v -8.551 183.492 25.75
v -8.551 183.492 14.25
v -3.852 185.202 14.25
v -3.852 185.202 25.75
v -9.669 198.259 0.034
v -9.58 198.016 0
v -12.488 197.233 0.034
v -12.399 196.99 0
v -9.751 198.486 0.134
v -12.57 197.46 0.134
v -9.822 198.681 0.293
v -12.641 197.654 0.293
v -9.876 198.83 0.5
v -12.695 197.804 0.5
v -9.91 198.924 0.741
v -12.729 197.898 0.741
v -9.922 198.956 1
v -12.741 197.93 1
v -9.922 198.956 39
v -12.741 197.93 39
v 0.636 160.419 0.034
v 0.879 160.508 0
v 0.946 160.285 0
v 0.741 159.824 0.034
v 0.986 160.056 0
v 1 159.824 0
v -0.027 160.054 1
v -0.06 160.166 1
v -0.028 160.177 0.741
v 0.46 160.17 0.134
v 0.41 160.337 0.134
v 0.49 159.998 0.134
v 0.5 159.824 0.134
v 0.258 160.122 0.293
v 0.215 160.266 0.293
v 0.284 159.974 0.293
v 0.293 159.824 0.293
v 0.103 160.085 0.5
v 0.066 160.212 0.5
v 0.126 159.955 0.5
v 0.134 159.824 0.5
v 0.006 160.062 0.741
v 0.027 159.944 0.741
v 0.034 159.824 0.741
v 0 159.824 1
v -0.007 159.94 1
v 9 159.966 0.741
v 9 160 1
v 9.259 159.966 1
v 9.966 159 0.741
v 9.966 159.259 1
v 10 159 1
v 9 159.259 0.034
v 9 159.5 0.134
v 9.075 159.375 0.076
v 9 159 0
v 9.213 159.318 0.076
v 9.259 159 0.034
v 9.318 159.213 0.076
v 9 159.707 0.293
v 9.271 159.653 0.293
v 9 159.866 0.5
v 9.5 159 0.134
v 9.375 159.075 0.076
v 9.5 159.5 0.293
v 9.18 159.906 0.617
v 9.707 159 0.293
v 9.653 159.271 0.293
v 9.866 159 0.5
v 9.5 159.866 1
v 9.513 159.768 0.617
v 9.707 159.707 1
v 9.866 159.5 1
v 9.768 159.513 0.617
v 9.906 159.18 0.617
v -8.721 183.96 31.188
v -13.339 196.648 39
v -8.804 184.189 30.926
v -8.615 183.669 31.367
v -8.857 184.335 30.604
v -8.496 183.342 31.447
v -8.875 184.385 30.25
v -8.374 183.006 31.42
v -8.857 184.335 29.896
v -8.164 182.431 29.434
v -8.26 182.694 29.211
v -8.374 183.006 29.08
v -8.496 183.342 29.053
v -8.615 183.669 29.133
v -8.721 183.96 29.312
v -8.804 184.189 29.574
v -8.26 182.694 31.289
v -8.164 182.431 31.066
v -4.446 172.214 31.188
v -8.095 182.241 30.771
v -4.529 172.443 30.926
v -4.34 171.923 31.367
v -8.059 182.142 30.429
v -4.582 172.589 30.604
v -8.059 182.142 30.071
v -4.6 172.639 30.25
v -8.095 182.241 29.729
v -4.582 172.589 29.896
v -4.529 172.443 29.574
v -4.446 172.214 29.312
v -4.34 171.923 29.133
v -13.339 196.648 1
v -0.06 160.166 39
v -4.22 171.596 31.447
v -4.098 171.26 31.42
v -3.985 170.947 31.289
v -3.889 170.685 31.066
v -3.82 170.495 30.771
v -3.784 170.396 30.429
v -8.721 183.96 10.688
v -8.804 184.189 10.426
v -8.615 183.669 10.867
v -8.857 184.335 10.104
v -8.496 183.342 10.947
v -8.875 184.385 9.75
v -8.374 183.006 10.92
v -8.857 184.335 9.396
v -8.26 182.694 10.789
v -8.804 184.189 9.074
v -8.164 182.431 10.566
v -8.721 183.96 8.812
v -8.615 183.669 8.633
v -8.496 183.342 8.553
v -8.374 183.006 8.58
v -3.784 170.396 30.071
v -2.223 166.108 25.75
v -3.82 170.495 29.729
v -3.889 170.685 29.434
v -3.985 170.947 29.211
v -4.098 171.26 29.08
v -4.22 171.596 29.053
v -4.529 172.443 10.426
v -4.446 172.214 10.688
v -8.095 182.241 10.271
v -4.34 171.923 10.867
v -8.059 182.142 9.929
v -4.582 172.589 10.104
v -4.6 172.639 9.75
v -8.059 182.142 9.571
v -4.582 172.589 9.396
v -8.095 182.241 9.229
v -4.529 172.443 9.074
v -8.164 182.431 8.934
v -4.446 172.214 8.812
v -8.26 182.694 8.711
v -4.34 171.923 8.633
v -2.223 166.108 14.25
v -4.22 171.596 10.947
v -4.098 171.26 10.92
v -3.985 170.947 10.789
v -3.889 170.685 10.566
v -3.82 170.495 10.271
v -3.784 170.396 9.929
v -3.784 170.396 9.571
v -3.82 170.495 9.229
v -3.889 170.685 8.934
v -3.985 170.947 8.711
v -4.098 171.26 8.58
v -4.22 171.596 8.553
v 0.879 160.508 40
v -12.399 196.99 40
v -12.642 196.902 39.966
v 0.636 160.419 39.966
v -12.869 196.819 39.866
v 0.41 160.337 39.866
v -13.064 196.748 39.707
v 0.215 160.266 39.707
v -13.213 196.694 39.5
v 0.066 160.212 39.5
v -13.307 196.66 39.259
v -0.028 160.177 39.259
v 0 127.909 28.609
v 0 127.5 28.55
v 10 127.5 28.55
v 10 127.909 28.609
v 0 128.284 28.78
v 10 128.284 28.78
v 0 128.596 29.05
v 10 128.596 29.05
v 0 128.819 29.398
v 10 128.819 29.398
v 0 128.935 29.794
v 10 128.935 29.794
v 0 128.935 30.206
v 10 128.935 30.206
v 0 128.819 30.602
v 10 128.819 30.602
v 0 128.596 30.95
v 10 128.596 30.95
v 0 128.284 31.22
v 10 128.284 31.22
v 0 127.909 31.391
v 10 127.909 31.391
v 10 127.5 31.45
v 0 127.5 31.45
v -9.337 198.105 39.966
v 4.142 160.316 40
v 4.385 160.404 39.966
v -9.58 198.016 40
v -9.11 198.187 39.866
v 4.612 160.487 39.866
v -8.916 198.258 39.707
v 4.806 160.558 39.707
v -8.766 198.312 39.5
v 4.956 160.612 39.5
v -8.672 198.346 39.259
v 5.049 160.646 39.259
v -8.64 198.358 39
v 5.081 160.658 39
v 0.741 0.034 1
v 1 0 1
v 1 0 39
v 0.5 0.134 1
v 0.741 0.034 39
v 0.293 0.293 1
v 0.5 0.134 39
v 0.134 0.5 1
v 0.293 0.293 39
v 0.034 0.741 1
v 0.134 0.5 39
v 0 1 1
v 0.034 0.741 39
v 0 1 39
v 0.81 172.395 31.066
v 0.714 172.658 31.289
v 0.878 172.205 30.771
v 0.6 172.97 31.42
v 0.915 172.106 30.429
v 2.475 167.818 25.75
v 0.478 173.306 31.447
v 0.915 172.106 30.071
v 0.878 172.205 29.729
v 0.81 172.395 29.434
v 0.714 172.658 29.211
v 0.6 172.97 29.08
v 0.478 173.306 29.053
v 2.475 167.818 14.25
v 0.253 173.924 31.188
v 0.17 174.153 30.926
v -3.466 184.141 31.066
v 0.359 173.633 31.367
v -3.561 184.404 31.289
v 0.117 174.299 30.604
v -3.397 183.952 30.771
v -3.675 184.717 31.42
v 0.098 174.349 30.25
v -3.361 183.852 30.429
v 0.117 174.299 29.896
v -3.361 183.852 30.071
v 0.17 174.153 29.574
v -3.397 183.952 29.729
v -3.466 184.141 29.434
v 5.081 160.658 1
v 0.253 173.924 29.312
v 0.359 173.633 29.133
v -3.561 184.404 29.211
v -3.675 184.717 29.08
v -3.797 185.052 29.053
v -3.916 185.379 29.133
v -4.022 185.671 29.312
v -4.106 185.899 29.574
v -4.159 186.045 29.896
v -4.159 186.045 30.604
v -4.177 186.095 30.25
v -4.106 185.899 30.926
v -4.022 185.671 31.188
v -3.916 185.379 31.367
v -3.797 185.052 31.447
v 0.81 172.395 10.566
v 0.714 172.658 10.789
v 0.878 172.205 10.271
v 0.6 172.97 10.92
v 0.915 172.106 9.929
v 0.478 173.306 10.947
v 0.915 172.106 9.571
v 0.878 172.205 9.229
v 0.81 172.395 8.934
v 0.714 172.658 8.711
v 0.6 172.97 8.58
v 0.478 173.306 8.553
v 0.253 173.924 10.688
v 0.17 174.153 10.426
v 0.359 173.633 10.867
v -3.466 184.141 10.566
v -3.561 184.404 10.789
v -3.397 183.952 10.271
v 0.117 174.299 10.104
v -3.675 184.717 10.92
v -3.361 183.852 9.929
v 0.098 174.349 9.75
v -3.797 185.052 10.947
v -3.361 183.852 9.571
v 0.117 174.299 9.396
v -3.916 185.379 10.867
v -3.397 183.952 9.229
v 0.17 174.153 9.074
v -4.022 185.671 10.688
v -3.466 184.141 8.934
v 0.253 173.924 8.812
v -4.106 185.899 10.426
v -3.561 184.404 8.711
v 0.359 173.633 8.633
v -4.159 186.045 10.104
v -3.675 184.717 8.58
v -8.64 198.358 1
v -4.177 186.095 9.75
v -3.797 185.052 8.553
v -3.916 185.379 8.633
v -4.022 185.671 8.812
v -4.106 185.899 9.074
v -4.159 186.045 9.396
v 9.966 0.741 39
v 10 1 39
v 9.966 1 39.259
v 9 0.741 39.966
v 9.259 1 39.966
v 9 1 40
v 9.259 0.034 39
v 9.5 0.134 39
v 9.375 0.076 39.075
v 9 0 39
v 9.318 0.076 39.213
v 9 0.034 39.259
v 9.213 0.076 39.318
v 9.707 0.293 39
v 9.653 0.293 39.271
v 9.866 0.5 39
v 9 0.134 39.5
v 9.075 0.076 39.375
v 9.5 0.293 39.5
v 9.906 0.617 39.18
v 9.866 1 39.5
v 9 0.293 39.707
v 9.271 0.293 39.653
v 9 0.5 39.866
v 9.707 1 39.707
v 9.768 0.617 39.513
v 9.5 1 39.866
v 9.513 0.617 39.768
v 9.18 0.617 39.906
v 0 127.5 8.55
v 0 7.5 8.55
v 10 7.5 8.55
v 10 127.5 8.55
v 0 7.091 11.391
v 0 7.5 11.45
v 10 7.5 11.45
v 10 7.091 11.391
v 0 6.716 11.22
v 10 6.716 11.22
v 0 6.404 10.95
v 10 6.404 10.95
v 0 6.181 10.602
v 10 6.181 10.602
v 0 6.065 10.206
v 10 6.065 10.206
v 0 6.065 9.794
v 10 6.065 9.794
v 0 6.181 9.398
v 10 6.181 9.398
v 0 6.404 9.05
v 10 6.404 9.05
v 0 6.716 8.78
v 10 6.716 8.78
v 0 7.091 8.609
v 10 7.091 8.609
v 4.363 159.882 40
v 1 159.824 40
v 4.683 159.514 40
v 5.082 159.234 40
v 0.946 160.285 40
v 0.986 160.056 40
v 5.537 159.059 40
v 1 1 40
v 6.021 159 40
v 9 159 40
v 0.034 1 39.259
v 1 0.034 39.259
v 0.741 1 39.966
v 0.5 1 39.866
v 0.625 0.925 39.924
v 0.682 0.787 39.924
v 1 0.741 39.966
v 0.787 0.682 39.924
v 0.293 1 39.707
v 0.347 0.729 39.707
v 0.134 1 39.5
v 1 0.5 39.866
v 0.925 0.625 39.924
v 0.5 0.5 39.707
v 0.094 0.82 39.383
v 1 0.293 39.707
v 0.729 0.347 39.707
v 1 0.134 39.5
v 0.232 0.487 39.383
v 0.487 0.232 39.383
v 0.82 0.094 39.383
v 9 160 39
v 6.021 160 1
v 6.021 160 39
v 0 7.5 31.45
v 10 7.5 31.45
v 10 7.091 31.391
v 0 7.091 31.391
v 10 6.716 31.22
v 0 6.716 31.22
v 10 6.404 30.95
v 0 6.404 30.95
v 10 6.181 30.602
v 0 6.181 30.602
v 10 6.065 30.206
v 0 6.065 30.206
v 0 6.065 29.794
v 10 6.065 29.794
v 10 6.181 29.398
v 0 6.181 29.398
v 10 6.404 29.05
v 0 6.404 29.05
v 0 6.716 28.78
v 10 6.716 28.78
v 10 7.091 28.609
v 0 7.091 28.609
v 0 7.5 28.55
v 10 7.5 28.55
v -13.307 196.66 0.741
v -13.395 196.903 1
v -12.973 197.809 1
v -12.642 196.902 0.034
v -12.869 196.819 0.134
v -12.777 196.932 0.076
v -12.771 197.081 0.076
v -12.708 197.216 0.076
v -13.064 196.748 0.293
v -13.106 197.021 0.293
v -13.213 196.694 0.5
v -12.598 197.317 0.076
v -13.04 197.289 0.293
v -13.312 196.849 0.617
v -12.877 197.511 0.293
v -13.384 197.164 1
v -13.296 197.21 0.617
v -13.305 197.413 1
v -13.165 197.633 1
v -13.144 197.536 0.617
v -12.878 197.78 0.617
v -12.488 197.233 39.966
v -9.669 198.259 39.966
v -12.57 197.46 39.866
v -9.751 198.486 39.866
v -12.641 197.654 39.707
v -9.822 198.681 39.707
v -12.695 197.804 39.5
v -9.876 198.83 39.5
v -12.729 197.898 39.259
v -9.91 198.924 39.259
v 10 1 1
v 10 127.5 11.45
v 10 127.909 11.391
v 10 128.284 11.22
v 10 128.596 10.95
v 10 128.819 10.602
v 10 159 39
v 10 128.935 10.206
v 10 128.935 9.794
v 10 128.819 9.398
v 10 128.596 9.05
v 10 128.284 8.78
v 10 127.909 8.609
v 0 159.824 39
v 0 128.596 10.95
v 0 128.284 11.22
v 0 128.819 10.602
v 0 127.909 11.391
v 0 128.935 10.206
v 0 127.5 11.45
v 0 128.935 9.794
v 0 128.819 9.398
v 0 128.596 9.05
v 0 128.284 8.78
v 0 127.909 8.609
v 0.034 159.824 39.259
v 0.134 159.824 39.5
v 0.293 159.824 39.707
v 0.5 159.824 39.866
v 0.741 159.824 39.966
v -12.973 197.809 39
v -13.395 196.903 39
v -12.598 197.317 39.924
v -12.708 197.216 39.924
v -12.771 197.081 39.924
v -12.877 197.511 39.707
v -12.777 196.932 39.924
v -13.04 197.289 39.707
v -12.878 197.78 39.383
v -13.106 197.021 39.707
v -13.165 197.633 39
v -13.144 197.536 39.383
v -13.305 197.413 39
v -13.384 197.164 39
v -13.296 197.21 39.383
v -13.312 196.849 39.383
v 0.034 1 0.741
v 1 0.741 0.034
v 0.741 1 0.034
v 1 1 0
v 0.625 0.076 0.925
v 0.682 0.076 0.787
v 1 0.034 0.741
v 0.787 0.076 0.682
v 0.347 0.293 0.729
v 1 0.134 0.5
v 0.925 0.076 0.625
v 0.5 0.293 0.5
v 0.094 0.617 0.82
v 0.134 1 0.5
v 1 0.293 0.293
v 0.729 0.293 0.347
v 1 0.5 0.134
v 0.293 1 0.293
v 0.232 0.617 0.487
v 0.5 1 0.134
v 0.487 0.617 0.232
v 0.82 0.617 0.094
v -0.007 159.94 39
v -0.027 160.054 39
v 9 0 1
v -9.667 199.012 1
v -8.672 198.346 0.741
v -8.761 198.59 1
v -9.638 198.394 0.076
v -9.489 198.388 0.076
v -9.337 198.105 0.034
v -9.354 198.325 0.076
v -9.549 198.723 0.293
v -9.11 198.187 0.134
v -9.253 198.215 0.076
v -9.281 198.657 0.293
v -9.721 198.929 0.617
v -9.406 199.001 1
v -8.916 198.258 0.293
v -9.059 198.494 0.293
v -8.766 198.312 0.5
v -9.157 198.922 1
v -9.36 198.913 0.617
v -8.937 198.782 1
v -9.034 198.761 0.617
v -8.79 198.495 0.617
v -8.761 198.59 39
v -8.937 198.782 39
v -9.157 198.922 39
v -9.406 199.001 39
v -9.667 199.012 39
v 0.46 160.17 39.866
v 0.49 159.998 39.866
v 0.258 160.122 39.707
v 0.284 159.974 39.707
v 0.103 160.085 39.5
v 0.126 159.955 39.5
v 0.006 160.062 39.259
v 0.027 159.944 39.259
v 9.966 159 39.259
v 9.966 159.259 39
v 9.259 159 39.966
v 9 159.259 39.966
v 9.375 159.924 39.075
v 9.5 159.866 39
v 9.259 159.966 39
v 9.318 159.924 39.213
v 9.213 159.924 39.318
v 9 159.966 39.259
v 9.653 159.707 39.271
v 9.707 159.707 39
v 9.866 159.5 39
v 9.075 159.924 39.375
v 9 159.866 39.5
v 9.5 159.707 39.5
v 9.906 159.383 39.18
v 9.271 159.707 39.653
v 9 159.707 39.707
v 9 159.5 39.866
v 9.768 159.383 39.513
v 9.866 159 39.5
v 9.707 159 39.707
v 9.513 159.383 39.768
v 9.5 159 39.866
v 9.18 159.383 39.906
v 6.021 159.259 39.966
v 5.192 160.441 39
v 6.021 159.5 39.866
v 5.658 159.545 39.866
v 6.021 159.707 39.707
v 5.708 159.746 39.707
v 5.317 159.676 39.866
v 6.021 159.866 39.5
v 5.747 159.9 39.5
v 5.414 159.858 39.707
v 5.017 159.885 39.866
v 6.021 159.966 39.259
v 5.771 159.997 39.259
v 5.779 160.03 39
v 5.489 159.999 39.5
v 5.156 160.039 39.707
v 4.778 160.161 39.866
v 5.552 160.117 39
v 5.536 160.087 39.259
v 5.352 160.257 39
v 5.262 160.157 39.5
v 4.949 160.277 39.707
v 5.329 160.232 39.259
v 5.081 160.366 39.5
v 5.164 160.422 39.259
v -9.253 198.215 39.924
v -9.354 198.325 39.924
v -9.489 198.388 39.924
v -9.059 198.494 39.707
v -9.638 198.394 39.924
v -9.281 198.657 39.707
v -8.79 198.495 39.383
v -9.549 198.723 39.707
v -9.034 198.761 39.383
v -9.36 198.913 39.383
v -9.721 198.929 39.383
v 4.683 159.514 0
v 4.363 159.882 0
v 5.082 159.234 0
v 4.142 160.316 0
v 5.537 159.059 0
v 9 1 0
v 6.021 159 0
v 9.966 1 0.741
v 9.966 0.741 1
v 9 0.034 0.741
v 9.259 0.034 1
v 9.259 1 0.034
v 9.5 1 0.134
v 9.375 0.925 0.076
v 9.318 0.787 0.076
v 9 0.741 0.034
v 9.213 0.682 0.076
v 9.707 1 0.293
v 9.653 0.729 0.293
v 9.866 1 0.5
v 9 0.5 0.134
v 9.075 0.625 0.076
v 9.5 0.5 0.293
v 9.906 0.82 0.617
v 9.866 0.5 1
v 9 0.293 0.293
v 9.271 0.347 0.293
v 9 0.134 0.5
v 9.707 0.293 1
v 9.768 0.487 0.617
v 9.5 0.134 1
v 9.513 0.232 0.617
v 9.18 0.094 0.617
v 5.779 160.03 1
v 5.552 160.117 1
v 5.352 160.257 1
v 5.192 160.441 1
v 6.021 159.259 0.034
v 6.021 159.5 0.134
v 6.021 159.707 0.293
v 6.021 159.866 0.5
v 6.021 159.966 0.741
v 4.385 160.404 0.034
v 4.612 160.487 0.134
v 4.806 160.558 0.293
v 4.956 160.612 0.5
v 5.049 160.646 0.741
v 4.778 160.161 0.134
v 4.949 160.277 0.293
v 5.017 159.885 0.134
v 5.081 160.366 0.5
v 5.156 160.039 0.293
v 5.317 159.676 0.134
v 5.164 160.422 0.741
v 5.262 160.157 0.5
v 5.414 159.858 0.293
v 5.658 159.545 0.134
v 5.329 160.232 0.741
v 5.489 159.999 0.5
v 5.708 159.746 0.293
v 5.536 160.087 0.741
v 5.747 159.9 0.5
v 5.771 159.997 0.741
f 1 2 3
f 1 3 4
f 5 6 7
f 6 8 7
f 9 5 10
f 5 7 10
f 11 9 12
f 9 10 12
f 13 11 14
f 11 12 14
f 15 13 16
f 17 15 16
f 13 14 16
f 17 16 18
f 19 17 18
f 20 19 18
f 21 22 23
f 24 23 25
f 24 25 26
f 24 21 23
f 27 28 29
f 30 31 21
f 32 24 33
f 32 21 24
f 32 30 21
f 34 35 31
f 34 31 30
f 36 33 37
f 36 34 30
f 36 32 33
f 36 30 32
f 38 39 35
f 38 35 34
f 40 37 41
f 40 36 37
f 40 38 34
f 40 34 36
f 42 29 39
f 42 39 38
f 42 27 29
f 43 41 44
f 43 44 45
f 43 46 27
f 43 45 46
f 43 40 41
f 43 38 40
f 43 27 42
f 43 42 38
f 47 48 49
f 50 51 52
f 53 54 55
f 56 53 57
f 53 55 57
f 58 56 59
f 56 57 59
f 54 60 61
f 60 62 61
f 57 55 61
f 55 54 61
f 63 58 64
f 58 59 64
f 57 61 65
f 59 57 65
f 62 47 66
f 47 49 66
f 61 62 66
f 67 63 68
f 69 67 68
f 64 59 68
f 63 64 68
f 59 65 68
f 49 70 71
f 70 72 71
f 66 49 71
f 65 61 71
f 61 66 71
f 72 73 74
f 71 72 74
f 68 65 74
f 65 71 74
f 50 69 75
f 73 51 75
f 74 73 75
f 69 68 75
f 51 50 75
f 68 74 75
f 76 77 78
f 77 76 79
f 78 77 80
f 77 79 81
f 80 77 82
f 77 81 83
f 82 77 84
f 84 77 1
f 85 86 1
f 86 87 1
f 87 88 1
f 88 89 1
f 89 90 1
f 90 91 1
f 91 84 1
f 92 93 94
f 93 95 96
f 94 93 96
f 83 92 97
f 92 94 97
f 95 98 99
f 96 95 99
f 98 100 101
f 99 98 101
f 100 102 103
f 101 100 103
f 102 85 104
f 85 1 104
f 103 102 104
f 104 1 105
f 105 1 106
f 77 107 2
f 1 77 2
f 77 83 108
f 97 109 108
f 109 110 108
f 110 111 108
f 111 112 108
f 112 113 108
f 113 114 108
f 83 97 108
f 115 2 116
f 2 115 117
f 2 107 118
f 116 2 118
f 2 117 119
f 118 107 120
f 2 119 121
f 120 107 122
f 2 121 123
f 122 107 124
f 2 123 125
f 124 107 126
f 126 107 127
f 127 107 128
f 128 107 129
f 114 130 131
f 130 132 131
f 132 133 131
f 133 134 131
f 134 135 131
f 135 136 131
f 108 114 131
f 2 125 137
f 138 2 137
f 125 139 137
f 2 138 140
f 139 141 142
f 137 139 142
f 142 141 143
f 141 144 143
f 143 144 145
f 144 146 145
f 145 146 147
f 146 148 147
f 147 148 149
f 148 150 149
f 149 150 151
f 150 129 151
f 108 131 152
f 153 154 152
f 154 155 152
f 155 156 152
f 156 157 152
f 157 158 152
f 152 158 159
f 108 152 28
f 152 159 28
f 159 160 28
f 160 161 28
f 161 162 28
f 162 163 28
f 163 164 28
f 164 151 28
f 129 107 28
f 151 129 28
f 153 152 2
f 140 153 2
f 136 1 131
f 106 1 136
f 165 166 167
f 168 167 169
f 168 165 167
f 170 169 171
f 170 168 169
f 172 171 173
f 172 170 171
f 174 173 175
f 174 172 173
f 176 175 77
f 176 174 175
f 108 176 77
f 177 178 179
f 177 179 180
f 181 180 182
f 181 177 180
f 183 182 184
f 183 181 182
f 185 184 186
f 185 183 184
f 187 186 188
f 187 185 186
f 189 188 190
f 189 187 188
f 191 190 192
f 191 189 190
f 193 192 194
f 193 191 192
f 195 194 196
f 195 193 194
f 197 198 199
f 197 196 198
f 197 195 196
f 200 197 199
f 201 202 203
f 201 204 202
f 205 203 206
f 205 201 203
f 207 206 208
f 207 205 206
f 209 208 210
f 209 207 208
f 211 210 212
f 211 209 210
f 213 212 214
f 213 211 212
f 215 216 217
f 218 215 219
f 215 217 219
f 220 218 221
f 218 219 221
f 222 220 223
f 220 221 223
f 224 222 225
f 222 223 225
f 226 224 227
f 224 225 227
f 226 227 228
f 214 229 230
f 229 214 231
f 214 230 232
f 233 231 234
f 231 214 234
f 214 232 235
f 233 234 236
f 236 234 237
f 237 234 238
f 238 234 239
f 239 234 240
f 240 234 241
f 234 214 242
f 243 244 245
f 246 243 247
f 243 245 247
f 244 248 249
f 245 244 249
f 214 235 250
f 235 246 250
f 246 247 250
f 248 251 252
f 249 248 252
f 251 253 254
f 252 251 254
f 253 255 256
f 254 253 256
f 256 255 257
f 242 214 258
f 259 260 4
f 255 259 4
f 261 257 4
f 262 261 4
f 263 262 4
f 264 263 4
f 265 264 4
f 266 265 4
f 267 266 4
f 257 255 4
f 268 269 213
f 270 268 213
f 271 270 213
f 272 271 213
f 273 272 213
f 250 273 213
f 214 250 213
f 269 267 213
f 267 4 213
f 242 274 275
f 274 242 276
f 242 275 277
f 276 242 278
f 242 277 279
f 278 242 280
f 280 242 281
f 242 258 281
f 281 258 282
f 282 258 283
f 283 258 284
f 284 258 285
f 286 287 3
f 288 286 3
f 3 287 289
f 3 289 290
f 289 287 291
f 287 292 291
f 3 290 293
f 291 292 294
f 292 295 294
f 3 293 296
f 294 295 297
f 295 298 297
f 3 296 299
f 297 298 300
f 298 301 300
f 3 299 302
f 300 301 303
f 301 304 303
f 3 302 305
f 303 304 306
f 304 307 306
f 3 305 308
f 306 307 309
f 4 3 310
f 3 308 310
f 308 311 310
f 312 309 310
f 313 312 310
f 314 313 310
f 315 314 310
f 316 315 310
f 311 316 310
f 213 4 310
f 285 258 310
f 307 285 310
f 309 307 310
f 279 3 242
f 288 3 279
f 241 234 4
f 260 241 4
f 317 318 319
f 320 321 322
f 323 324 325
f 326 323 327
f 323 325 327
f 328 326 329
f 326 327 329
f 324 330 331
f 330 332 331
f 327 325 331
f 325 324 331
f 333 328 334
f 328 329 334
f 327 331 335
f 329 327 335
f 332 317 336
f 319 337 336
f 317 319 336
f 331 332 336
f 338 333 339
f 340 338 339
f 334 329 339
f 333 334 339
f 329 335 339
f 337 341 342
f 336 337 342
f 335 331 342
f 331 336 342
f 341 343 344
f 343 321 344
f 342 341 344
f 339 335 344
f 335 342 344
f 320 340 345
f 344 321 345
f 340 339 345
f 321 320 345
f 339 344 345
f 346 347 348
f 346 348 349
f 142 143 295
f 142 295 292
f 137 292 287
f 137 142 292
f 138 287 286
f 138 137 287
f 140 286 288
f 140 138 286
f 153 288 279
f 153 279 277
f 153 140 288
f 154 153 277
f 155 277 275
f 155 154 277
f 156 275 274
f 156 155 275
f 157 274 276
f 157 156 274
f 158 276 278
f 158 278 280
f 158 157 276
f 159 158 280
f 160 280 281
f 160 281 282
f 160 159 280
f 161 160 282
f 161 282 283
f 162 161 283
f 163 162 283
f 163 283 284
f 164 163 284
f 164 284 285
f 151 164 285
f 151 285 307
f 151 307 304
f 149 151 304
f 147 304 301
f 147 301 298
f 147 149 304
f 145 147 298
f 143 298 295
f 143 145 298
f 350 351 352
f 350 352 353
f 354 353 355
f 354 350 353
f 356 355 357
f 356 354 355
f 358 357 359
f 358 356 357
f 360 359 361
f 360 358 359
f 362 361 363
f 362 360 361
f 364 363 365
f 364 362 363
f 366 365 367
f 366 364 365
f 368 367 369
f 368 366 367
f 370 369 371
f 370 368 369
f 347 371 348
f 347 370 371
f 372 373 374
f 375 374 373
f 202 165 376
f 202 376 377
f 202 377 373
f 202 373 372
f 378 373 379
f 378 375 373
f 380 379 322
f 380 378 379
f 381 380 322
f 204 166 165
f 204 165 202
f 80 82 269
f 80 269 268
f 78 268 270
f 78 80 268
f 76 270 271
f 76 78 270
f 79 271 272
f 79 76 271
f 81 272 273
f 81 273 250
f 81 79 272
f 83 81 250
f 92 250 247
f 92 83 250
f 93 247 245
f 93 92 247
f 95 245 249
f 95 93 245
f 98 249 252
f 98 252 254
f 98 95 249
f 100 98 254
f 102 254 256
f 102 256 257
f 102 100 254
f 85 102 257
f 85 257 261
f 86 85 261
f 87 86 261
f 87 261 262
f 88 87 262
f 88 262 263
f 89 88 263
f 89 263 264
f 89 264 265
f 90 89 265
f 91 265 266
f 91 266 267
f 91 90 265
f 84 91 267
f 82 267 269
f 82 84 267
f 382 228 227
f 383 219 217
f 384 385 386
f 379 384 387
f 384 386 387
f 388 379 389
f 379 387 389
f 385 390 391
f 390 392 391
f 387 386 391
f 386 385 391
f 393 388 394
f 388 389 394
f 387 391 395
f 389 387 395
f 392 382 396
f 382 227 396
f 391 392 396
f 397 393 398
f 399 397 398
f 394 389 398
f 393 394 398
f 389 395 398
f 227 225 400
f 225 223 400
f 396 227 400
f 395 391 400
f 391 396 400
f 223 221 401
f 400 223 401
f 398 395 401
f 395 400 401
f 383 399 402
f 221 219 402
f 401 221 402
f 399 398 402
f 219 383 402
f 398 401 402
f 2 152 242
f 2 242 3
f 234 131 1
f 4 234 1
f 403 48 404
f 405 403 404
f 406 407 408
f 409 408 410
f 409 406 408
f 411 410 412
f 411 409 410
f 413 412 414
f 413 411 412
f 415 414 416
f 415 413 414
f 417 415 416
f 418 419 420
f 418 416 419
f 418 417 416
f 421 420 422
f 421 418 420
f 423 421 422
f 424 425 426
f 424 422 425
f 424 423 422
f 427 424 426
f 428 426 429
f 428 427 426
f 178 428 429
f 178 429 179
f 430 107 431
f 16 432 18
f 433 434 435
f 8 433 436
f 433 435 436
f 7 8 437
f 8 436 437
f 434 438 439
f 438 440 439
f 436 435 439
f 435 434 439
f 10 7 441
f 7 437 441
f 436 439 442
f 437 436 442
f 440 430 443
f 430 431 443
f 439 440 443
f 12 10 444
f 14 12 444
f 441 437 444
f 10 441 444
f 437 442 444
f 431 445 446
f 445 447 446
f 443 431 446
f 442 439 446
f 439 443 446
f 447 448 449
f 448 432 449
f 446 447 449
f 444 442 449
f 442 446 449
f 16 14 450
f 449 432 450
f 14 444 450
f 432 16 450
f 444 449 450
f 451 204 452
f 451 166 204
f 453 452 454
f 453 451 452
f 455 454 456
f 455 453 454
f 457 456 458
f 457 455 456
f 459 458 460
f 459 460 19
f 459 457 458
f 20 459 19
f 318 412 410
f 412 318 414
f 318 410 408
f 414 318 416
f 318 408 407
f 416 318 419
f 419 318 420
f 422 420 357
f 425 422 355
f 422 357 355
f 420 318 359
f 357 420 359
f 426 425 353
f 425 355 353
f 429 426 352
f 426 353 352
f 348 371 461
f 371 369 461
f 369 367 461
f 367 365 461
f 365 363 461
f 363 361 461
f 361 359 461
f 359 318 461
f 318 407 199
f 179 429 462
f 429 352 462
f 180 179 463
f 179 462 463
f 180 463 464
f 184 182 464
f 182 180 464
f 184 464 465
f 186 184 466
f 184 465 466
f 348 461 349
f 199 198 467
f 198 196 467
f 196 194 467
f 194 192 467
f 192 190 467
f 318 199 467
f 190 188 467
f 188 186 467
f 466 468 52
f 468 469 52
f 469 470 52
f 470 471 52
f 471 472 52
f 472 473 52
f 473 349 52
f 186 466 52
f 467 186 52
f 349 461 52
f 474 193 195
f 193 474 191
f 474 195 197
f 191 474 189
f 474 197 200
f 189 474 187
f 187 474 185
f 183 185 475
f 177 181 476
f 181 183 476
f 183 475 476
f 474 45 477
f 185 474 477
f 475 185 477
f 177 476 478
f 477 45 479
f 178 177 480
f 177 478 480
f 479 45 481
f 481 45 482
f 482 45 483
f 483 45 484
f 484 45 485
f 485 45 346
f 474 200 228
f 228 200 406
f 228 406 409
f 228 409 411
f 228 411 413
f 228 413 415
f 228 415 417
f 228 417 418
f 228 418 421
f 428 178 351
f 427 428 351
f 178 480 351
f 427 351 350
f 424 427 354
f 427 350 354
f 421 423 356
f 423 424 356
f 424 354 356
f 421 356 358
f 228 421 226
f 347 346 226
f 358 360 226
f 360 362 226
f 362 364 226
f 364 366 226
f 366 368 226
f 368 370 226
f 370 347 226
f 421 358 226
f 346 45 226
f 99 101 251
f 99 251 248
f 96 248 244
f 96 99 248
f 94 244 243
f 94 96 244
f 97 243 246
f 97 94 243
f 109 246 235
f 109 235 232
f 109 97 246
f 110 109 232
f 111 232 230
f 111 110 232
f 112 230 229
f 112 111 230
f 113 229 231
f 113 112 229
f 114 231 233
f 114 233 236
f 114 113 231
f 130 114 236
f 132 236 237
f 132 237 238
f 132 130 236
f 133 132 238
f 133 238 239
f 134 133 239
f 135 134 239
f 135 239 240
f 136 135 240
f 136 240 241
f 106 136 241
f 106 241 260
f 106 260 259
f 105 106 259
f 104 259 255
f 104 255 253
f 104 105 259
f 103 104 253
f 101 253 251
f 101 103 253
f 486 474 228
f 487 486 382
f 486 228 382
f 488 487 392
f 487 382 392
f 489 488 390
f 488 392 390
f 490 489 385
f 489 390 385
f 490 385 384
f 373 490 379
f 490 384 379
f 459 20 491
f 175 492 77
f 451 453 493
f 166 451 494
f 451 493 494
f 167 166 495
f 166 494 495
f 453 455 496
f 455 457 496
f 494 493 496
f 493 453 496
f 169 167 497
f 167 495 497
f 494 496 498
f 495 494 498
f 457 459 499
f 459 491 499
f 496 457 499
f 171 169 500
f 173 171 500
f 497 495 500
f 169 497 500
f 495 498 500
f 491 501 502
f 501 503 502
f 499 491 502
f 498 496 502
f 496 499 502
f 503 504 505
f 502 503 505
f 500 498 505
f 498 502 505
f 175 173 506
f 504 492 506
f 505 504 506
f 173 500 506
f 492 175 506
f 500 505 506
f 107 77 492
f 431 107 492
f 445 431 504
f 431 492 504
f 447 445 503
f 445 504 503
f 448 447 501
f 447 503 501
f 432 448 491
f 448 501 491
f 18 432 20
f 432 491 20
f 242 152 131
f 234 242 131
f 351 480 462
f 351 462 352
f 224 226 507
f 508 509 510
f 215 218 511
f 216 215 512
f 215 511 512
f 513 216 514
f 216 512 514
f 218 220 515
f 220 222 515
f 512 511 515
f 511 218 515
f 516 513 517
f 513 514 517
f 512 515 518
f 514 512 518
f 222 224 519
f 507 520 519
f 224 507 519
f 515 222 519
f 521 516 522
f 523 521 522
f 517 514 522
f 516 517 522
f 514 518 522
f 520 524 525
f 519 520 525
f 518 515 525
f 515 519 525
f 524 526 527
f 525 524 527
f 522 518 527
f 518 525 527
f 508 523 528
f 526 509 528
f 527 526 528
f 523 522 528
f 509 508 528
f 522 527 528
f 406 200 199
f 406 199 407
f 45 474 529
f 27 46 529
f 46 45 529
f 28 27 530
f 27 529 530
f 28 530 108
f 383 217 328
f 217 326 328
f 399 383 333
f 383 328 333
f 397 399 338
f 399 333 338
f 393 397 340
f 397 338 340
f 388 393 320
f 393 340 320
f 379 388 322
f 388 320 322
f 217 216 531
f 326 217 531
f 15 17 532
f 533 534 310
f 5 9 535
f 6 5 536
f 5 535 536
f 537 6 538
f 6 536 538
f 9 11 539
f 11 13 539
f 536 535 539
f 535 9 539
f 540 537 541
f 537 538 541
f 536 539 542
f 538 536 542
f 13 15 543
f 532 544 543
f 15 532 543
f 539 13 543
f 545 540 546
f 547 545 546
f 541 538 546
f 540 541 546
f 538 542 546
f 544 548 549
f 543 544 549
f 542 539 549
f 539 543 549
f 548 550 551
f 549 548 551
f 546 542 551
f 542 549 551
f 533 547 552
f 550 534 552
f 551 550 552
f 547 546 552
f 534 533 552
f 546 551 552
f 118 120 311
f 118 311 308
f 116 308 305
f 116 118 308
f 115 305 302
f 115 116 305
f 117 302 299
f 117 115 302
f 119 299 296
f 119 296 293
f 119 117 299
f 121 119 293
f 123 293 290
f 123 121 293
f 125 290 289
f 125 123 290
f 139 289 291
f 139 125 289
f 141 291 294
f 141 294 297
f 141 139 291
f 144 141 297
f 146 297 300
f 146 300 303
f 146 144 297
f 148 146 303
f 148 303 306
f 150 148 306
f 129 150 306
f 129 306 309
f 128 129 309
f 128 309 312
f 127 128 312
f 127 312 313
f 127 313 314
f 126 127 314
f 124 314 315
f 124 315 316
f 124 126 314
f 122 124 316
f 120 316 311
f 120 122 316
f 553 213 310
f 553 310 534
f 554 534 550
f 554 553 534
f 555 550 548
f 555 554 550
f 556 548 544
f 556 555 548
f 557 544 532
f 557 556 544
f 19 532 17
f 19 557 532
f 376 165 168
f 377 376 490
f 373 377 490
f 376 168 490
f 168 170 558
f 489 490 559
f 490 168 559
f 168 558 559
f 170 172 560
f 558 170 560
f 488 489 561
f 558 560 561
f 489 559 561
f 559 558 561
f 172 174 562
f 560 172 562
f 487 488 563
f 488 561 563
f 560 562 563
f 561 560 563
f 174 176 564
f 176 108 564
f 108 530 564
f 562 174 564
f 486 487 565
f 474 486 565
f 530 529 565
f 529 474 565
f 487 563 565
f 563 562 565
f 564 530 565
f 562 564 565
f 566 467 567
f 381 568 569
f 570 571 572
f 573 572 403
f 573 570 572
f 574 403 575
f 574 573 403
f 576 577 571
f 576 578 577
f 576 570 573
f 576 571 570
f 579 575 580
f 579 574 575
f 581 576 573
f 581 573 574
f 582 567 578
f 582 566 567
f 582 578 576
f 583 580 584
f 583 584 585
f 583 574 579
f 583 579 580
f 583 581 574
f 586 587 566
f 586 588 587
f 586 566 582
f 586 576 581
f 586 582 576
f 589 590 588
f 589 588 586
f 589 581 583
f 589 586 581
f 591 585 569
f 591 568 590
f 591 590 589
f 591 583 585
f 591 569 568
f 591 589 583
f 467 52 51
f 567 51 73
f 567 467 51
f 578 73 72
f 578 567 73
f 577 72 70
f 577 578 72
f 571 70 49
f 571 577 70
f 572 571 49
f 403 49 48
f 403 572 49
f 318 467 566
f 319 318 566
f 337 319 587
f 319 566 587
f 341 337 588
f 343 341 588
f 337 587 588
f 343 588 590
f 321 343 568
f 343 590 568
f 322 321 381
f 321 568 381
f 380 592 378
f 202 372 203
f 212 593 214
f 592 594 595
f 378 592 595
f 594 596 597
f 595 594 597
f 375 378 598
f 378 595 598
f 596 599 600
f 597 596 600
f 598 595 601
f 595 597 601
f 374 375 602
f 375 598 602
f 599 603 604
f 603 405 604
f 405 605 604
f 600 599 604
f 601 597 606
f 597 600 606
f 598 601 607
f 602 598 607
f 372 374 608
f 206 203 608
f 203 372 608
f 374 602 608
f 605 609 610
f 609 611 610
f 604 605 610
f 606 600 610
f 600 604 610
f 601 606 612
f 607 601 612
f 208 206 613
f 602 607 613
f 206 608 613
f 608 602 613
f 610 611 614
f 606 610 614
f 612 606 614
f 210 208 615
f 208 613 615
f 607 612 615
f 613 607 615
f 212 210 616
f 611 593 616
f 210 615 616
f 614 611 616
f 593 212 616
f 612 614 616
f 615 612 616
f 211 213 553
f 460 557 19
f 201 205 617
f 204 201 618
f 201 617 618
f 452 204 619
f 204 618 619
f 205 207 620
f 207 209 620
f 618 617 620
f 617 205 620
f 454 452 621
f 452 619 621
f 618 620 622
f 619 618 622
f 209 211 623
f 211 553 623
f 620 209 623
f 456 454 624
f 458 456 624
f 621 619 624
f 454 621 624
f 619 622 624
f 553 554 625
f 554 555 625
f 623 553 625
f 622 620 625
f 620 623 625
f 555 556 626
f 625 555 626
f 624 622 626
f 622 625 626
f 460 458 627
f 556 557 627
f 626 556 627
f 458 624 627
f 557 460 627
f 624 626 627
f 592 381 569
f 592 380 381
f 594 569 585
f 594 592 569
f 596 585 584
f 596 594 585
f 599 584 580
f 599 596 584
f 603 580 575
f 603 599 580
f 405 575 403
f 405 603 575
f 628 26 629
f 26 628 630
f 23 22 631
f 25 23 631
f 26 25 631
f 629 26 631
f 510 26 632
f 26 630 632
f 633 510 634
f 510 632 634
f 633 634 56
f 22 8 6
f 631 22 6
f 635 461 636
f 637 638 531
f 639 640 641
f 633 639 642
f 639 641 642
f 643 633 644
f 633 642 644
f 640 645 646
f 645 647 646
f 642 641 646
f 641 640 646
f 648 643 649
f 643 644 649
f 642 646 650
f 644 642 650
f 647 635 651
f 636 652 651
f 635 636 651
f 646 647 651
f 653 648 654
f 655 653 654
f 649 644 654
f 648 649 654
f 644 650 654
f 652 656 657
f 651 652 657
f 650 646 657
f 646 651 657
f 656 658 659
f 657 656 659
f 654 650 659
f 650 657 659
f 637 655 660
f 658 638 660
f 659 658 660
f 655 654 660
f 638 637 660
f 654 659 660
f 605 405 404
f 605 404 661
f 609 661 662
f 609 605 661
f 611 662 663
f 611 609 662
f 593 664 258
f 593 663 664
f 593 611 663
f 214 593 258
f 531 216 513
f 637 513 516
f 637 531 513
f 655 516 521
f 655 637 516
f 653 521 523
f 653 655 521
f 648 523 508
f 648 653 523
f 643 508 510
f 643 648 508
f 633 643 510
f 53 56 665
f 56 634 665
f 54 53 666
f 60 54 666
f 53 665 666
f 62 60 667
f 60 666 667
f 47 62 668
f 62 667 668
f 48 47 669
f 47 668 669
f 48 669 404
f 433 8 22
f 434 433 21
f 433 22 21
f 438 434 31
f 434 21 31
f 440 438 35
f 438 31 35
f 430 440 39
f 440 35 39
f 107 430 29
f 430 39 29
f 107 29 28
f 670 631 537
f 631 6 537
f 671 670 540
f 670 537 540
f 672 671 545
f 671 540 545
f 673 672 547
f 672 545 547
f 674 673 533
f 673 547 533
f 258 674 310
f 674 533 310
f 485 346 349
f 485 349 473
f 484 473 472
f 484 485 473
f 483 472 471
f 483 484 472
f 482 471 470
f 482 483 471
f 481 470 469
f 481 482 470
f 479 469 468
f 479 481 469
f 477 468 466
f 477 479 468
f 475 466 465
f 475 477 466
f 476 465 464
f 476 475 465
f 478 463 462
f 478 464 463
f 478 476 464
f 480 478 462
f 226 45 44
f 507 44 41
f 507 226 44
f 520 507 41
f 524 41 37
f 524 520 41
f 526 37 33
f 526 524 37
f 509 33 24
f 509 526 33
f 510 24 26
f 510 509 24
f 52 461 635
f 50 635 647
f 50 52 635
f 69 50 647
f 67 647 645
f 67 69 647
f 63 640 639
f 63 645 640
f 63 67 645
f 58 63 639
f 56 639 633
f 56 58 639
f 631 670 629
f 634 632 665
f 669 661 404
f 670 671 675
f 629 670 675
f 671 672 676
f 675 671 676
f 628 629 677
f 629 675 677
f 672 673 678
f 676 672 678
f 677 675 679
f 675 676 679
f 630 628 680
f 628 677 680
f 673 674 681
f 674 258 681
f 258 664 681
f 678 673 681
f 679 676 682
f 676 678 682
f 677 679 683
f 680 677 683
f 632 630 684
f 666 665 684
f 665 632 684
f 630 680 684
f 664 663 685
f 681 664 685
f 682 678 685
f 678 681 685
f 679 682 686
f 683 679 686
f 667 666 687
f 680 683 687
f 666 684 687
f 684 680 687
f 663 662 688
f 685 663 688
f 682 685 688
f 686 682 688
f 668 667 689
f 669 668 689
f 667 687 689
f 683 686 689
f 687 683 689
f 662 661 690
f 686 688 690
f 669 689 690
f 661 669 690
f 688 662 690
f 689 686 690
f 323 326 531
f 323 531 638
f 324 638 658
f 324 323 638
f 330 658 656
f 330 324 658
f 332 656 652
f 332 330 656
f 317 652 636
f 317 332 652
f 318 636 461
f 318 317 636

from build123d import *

# Parameters (mm, degrees)
BOSS_EXTRU_1_DEPTH       = 40
D_GAGEMENT_START         = 54.723222932
D_GAGEMENT_M22_OUTLINE_R = 1.2
D_GAGEMENT_M22_DEPTH     = 5
ENL_V_MAT_EXTRU_3_REACH  = 166.408
ESQUISSE12_W             = 11.5
ESQUISSE12_H             = 18.5
CONG_2_R                 = 1
ENL_V_MAT_EXTRU_4_REACH  = 205.438


# Read off the part's stored shape, not the designer's step: Dégagement M22
with BuildPart() as part:
    # Esquisse1 → Boss.-Extru.1 (new body)
    with BuildSketch(Plane.XY):
        Polygon((0, 0), (10, 0), (10, 160), (5.320888862, 160), (-8.982342629, 199.297805548), (-13.680805733, 197.587704831), (0, 160), align=None)
    extrude(amount=BOSS_EXTRU_1_DEPTH)

    # Dégagement M22 outline → Dégagement M22 (cut)
    with BuildSketch(Plane(origin=(0, 0, 0), x_dir=(-0.3420201433256691, 0.9396926207859082, 0), z_dir=(0.9396926207859083, 0.3420201433256691, 0)).offset(D_GAGEMENT_START)):
        with Locations((162.600819326, 30.25)):
            Circle(D_GAGEMENT_M22_OUTLINE_R)
        with Locations((175.100819326, 9.75)):
            Circle(D_GAGEMENT_M22_OUTLINE_R)
        with Locations((175.100819326, 30.25)):
            Circle(D_GAGEMENT_M22_OUTLINE_R)
        with Locations((162.600819326, 9.75)):
            Circle(D_GAGEMENT_M22_OUTLINE_R)
    extrude(amount=D_GAGEMENT_M22_DEPTH, mode=Mode.SUBTRACT)

    # Esquisse12 → Enlèv. mat.-Extru.3 (cut, up to next)
    with BuildSketch(Plane(origin=(39.231681983, 52.211839625, 50.949763499), x_dir=(0, 0, 1), z_dir=(-0.9396926207859084, -0.3420201433256691, 0)), mode=Mode.PRIVATE) as enl_v_mat_extru_3_sk1:
        with Locations((-30.949763499, 130.455764407)):
            Rectangle(ESQUISSE12_W, ESQUISSE12_H)
    enl_v_mat_extru_3_tool1 = extrude(enl_v_mat_extru_3_sk1.sketch, amount=-ENL_V_MAT_EXTRU_3_REACH, mode=Mode.PRIVATE) & part.part
    add(enl_v_mat_extru_3_tool1.solids().sort_by_distance((-5.386817, 174.800159, 20))[0], mode=Mode.SUBTRACT)

    # Congé2
    cong_2_edges = [part.edges().sort_by_distance(p)[0] for p in [
        (0, 80, 0),
        (0, 160, 20),
        (-13.680805733, 197.587704831, 20),
        (-8.982342629, 199.297805548, 20),
        (10, 80, 40),
        (5.320888862, 160, 20),
        (10, 160, 20),
        (10, 0, 20),
        (0, 0, 20),
        (7.660444431, 160, 40),
        (-1.830726883, 179.648902774, 40),
        (-11.331574181, 198.44275519, 40),
        (-6.840402867, 178.793852416, 40),
        (0, 80, 40),
        (-6.840402867, 178.793852416, 0),
        (-11.331574181, 198.44275519, 0),
        (-1.830726883, 179.648902774, 0),
        (7.660444431, 160, 0),
        (5, 0, 40),
        (10, 80, 0),
        (5, 0, 0),
    ]]
    fillet(cong_2_edges, radius=CONG_2_R)

    # Esquisse13 → Enlèv. mat.-Extru.4 (cut, up to next)
    with BuildSketch(Plane.ZY, mode=Mode.PRIVATE) as enl_v_mat_extru_4_sk1:
        with BuildLine():
            Line((8.55, 7.5), (8.55, 127.5))
            ThreePointArc((8.55, 127.5), (10, 128.95), (11.45, 127.5))
            Line((11.45, 127.5), (11.45, 7.5))
            ThreePointArc((11.45, 7.5), (10, 6.05), (8.55, 7.5))
        make_face()
    enl_v_mat_extru_4_tool1 = extrude(enl_v_mat_extru_4_sk1.sketch, amount=-ENL_V_MAT_EXTRU_4_REACH, mode=Mode.PRIVATE) & part.part
    # Esquisse13 → Enlèv. mat.-Extru.4 (cut, up to next)
    with BuildSketch(Plane.ZY, mode=Mode.PRIVATE) as enl_v_mat_extru_4_sk2:
        with BuildLine():
            Line((28.55, 7.5), (28.55, 127.5))
            ThreePointArc((28.55, 127.5), (30, 128.95), (31.45, 127.5))
            Line((31.45, 127.5), (31.45, 7.5))
            ThreePointArc((31.45, 7.5), (30, 6.05), (28.55, 7.5))
        make_face()
    enl_v_mat_extru_4_tool2 = extrude(enl_v_mat_extru_4_sk2.sketch, amount=-ENL_V_MAT_EXTRU_4_REACH, mode=Mode.PRIVATE) & part.part
    add(enl_v_mat_extru_4_tool1.solids().sort_by_distance((0, 67.5, 10))[0], mode=Mode.SUBTRACT)
    add(enl_v_mat_extru_4_tool2.solids().sort_by_distance((0, 67.5, 30))[0], mode=Mode.SUBTRACT)


solid = part.part
